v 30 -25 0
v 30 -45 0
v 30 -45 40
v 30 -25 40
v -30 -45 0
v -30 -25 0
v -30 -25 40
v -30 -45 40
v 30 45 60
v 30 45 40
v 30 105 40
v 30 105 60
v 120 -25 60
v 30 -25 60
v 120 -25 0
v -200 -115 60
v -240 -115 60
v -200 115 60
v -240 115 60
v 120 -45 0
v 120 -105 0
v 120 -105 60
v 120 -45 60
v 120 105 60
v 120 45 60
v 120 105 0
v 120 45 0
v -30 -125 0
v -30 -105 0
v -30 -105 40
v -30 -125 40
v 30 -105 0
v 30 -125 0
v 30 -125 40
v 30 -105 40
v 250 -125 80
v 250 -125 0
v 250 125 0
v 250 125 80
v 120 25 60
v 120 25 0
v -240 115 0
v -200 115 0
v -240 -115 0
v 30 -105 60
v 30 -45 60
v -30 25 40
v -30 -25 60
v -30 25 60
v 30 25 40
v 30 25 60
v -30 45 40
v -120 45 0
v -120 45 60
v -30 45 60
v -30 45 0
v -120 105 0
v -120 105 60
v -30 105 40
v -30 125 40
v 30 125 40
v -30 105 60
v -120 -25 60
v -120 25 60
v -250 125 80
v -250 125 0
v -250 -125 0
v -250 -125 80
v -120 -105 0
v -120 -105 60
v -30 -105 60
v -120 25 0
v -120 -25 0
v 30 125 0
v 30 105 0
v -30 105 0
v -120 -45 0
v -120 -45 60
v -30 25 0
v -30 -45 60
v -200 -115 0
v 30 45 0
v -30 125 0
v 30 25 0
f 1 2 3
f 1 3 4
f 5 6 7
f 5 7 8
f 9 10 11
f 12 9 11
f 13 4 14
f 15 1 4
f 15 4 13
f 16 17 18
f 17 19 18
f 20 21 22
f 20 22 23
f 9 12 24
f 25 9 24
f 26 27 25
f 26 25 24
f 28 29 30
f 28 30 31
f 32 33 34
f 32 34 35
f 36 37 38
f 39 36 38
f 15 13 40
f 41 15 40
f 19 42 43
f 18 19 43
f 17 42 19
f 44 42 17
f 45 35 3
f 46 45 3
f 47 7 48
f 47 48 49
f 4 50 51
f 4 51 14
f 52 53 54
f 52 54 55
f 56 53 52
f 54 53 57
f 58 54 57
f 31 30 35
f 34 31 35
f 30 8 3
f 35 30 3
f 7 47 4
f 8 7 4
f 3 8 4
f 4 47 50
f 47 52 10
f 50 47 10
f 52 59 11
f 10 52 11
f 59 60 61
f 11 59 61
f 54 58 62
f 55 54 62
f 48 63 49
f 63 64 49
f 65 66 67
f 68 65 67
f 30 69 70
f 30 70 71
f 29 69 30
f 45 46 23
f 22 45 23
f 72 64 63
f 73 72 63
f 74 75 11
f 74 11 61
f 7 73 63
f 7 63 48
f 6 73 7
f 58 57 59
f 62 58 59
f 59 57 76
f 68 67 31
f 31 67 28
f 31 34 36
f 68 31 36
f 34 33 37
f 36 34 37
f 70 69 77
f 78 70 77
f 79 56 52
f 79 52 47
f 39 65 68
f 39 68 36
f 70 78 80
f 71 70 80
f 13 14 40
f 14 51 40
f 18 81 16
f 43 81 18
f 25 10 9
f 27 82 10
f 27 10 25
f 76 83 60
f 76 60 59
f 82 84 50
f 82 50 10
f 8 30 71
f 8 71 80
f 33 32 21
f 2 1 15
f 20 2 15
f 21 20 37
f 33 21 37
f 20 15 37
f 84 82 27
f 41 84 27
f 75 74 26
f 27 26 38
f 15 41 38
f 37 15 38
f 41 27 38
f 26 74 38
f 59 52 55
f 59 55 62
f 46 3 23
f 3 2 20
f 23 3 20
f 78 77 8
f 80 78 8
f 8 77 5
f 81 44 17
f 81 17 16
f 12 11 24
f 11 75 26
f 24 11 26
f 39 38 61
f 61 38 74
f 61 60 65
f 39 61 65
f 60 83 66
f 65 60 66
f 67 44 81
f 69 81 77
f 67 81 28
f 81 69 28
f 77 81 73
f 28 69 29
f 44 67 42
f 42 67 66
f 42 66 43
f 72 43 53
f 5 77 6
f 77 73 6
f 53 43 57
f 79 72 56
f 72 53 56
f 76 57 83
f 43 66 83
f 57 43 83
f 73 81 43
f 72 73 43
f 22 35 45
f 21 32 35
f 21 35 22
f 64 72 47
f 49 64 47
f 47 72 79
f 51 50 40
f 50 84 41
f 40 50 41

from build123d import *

# Parameters (mm, degrees)
F0_W     = 10
F0_H     = 115
F0_W_2   = 90
F0_H_2   = 20
F0_W_3   = 40
F0_H_3   = 60
F0_H_4   = 25
F0_W_4   = 30
F1_DEPTH = 80
F2_DEPTH = 60
F3_DEPTH = 40


with BuildPart() as f1:
    # F0 (on Top) → F1 (new body)
    with BuildSketch(Plane.XY):
        Polygon((-120, 125), (-250, 125), (-250, 115), (-240, 115), (-200, 115), (-120, 115), align=None)
        with Locations((-245, 57.5)):
            Rectangle(F0_W, F0_H)
        with Locations((-245, -57.5)):
            Rectangle(F0_W, F0_H)
        Polygon((-240, -115), (-250, -115), (-250, -125), (-120, -125), (-120, -115), (-200, -115), align=None)
        Polygon((-30, 125), (-120, 125), (-120, 115), (-120, 105), (-30, 105), align=None)
        Polygon((0, 125), (-30, 125), (-30, 105), (-30, 45), (-30, 25), (0, 25), align=None)
        with Locations((75, 115)):
            Rectangle(F0_W_2, F0_H_2)
        Polygon((30, 125), (0, 125), (0, 25), (30, 25), (30, 45), (30, 105), align=None)
        with Locations((-75, 35)):
            Rectangle(F0_W_2, F0_H_2)
        with Locations((-75, -35)):
            Rectangle(F0_W_2, F0_H_2)
        Polygon((-120, -115), (-120, -125), (-30, -125), (-30, -105), (-120, -105), align=None)
        Polygon((0, -125), (0, -25), (-30, -25), (-30, -45), (-30, -105), (-30, -125), align=None)
        Polygon((30, -25), (0, -25), (0, -125), (30, -125), (30, -105), (30, -45), align=None)
        with Locations((75, -35)):
            Rectangle(F0_W_2, F0_H_2)
        with Locations((75, 35)):
            Rectangle(F0_W_2, F0_H_2)
        with Locations((75, -115)):
            Rectangle(F0_W_2, F0_H_2)
        Polygon((250, 125), (120, 125), (120, 105), (120, 45), (120, 25), (120, 0), (250, 0), align=None)
        Polygon((250, -125), (250, 0), (120, 0), (120, -25), (120, -45), (120, -105), (120, -125), align=None)
        Polygon((-120, 105), (-120, 115), (-200, 115), (-200, 0), (-120, 0), (-120, 25), (-120, 45), align=None)
        Polygon((-120, 0), (-200, 0), (-200, -115), (-120, -115), (-120, -105), (-120, -45), (-120, -25), align=None)
        with Locations((-220, 57.5)):
            Rectangle(F0_W_3, F0_H)
        with Locations((-220, -57.5)):
            Rectangle(F0_W_3, F0_H)
        with Locations((-75, 75)):
            Rectangle(F0_W_2, F0_H_3)
        with Locations((-75, 12.5)):
            Rectangle(F0_W_2, F0_H_4)
        with Locations((-75, -12.5)):
            Rectangle(F0_W_2, F0_H_4)
        with Locations((-75, -75)):
            Rectangle(F0_W_2, F0_H_3)
        with Locations((-15, -12.5)):
            Rectangle(F0_W_4, F0_H_4)
        with Locations((-15, 12.5)):
            Rectangle(F0_W_4, F0_H_4)
        with Locations((15, 12.5)):
            Rectangle(F0_W_4, F0_H_4)
        with Locations((75, 12.5)):
            Rectangle(F0_W_2, F0_H_4)
        with Locations((75, -75)):
            Rectangle(F0_W_2, F0_H_3)
        with Locations((75, -12.5)):
            Rectangle(F0_W_2, F0_H_4)
        with Locations((15, -12.5)):
            Rectangle(F0_W_4, F0_H_4)
        with Locations((75, 75)):
            Rectangle(F0_W_2, F0_H_3)
    extrude(amount=F1_DEPTH)

    # F0 (on Top) → F2 (cut)
    with BuildSketch(Plane.XY):
        with Locations((-220, -57.5)):
            Rectangle(F0_W_3, F0_H)
        with Locations((-220, 57.5)):
            Rectangle(F0_W_3, F0_H)
        with Locations((75, -75)):
            Rectangle(F0_W_2, F0_H_3)
        with Locations((-75, -75)):
            Rectangle(F0_W_2, F0_H_3)
        with Locations((75, 75)):
            Rectangle(F0_W_2, F0_H_3)
        with Locations((-75, 75)):
            Rectangle(F0_W_2, F0_H_3)
        with Locations((-75, -12.5)):
            Rectangle(F0_W_2, F0_H_4)
        with Locations((-75, 12.5)):
            Rectangle(F0_W_2, F0_H_4)
        with Locations((75, -12.5)):
            Rectangle(F0_W_2, F0_H_4)
        with Locations((75, 12.5)):
            Rectangle(F0_W_2, F0_H_4)
    extrude(amount=F2_DEPTH, mode=Mode.SUBTRACT)

    # F0 (on Top) → F3 (cut)
    with BuildSketch(Plane.XY):
        Polygon((0, -125), (0, -25), (-30, -25), (-30, -45), (-30, -105), (-30, -125), align=None)
        Polygon((30, 125), (0, 125), (0, 25), (30, 25), (30, 45), (30, 105), align=None)
        Polygon((0, 125), (-30, 125), (-30, 105), (-30, 45), (-30, 25), (0, 25), align=None)
        with Locations((-15, 12.5)):
            Rectangle(F0_W_4, F0_H_4)
        with Locations((-15, -12.5)):
            Rectangle(F0_W_4, F0_H_4)
        with Locations((15, -12.5)):
            Rectangle(F0_W_4, F0_H_4)
        with Locations((15, 12.5)):
            Rectangle(F0_W_4, F0_H_4)
        Polygon((30, -25), (0, -25), (0, -125), (30, -125), (30, -105), (30, -45), align=None)
    extrude(amount=F3_DEPTH, mode=Mode.SUBTRACT)


solid = f1.part
